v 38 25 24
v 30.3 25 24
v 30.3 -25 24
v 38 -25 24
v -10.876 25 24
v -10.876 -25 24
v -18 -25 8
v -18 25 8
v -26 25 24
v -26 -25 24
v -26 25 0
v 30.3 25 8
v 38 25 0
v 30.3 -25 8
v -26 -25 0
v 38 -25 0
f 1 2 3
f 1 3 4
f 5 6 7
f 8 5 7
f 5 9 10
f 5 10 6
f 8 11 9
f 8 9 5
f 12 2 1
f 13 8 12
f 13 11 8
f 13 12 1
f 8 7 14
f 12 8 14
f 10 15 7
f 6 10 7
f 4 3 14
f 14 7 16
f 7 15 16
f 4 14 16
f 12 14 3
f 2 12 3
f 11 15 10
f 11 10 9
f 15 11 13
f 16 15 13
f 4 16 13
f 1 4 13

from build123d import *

# Parameters (mm, degrees)
F0_W     = 64
F0_H     = 50
F1_DEPTH = 24
F3_DEPTH = 50


with BuildPart() as f1:
    # F0 (on Top) → F1 (new body)
    with BuildSketch(Plane.XY):
        with Locations((6, 0)):
            Rectangle(F0_W, F0_H)
    extrude(amount=F1_DEPTH)

    # F2 (on face) → F3 (cut)
    with BuildSketch(Plane.XZ.offset(25)):
        Polygon((30.3, 8), (30.3, 24), (-10.876341, 24), (-18, 8), align=None)
    extrude(amount=-F3_DEPTH, mode=Mode.SUBTRACT)


solid = f1.part
